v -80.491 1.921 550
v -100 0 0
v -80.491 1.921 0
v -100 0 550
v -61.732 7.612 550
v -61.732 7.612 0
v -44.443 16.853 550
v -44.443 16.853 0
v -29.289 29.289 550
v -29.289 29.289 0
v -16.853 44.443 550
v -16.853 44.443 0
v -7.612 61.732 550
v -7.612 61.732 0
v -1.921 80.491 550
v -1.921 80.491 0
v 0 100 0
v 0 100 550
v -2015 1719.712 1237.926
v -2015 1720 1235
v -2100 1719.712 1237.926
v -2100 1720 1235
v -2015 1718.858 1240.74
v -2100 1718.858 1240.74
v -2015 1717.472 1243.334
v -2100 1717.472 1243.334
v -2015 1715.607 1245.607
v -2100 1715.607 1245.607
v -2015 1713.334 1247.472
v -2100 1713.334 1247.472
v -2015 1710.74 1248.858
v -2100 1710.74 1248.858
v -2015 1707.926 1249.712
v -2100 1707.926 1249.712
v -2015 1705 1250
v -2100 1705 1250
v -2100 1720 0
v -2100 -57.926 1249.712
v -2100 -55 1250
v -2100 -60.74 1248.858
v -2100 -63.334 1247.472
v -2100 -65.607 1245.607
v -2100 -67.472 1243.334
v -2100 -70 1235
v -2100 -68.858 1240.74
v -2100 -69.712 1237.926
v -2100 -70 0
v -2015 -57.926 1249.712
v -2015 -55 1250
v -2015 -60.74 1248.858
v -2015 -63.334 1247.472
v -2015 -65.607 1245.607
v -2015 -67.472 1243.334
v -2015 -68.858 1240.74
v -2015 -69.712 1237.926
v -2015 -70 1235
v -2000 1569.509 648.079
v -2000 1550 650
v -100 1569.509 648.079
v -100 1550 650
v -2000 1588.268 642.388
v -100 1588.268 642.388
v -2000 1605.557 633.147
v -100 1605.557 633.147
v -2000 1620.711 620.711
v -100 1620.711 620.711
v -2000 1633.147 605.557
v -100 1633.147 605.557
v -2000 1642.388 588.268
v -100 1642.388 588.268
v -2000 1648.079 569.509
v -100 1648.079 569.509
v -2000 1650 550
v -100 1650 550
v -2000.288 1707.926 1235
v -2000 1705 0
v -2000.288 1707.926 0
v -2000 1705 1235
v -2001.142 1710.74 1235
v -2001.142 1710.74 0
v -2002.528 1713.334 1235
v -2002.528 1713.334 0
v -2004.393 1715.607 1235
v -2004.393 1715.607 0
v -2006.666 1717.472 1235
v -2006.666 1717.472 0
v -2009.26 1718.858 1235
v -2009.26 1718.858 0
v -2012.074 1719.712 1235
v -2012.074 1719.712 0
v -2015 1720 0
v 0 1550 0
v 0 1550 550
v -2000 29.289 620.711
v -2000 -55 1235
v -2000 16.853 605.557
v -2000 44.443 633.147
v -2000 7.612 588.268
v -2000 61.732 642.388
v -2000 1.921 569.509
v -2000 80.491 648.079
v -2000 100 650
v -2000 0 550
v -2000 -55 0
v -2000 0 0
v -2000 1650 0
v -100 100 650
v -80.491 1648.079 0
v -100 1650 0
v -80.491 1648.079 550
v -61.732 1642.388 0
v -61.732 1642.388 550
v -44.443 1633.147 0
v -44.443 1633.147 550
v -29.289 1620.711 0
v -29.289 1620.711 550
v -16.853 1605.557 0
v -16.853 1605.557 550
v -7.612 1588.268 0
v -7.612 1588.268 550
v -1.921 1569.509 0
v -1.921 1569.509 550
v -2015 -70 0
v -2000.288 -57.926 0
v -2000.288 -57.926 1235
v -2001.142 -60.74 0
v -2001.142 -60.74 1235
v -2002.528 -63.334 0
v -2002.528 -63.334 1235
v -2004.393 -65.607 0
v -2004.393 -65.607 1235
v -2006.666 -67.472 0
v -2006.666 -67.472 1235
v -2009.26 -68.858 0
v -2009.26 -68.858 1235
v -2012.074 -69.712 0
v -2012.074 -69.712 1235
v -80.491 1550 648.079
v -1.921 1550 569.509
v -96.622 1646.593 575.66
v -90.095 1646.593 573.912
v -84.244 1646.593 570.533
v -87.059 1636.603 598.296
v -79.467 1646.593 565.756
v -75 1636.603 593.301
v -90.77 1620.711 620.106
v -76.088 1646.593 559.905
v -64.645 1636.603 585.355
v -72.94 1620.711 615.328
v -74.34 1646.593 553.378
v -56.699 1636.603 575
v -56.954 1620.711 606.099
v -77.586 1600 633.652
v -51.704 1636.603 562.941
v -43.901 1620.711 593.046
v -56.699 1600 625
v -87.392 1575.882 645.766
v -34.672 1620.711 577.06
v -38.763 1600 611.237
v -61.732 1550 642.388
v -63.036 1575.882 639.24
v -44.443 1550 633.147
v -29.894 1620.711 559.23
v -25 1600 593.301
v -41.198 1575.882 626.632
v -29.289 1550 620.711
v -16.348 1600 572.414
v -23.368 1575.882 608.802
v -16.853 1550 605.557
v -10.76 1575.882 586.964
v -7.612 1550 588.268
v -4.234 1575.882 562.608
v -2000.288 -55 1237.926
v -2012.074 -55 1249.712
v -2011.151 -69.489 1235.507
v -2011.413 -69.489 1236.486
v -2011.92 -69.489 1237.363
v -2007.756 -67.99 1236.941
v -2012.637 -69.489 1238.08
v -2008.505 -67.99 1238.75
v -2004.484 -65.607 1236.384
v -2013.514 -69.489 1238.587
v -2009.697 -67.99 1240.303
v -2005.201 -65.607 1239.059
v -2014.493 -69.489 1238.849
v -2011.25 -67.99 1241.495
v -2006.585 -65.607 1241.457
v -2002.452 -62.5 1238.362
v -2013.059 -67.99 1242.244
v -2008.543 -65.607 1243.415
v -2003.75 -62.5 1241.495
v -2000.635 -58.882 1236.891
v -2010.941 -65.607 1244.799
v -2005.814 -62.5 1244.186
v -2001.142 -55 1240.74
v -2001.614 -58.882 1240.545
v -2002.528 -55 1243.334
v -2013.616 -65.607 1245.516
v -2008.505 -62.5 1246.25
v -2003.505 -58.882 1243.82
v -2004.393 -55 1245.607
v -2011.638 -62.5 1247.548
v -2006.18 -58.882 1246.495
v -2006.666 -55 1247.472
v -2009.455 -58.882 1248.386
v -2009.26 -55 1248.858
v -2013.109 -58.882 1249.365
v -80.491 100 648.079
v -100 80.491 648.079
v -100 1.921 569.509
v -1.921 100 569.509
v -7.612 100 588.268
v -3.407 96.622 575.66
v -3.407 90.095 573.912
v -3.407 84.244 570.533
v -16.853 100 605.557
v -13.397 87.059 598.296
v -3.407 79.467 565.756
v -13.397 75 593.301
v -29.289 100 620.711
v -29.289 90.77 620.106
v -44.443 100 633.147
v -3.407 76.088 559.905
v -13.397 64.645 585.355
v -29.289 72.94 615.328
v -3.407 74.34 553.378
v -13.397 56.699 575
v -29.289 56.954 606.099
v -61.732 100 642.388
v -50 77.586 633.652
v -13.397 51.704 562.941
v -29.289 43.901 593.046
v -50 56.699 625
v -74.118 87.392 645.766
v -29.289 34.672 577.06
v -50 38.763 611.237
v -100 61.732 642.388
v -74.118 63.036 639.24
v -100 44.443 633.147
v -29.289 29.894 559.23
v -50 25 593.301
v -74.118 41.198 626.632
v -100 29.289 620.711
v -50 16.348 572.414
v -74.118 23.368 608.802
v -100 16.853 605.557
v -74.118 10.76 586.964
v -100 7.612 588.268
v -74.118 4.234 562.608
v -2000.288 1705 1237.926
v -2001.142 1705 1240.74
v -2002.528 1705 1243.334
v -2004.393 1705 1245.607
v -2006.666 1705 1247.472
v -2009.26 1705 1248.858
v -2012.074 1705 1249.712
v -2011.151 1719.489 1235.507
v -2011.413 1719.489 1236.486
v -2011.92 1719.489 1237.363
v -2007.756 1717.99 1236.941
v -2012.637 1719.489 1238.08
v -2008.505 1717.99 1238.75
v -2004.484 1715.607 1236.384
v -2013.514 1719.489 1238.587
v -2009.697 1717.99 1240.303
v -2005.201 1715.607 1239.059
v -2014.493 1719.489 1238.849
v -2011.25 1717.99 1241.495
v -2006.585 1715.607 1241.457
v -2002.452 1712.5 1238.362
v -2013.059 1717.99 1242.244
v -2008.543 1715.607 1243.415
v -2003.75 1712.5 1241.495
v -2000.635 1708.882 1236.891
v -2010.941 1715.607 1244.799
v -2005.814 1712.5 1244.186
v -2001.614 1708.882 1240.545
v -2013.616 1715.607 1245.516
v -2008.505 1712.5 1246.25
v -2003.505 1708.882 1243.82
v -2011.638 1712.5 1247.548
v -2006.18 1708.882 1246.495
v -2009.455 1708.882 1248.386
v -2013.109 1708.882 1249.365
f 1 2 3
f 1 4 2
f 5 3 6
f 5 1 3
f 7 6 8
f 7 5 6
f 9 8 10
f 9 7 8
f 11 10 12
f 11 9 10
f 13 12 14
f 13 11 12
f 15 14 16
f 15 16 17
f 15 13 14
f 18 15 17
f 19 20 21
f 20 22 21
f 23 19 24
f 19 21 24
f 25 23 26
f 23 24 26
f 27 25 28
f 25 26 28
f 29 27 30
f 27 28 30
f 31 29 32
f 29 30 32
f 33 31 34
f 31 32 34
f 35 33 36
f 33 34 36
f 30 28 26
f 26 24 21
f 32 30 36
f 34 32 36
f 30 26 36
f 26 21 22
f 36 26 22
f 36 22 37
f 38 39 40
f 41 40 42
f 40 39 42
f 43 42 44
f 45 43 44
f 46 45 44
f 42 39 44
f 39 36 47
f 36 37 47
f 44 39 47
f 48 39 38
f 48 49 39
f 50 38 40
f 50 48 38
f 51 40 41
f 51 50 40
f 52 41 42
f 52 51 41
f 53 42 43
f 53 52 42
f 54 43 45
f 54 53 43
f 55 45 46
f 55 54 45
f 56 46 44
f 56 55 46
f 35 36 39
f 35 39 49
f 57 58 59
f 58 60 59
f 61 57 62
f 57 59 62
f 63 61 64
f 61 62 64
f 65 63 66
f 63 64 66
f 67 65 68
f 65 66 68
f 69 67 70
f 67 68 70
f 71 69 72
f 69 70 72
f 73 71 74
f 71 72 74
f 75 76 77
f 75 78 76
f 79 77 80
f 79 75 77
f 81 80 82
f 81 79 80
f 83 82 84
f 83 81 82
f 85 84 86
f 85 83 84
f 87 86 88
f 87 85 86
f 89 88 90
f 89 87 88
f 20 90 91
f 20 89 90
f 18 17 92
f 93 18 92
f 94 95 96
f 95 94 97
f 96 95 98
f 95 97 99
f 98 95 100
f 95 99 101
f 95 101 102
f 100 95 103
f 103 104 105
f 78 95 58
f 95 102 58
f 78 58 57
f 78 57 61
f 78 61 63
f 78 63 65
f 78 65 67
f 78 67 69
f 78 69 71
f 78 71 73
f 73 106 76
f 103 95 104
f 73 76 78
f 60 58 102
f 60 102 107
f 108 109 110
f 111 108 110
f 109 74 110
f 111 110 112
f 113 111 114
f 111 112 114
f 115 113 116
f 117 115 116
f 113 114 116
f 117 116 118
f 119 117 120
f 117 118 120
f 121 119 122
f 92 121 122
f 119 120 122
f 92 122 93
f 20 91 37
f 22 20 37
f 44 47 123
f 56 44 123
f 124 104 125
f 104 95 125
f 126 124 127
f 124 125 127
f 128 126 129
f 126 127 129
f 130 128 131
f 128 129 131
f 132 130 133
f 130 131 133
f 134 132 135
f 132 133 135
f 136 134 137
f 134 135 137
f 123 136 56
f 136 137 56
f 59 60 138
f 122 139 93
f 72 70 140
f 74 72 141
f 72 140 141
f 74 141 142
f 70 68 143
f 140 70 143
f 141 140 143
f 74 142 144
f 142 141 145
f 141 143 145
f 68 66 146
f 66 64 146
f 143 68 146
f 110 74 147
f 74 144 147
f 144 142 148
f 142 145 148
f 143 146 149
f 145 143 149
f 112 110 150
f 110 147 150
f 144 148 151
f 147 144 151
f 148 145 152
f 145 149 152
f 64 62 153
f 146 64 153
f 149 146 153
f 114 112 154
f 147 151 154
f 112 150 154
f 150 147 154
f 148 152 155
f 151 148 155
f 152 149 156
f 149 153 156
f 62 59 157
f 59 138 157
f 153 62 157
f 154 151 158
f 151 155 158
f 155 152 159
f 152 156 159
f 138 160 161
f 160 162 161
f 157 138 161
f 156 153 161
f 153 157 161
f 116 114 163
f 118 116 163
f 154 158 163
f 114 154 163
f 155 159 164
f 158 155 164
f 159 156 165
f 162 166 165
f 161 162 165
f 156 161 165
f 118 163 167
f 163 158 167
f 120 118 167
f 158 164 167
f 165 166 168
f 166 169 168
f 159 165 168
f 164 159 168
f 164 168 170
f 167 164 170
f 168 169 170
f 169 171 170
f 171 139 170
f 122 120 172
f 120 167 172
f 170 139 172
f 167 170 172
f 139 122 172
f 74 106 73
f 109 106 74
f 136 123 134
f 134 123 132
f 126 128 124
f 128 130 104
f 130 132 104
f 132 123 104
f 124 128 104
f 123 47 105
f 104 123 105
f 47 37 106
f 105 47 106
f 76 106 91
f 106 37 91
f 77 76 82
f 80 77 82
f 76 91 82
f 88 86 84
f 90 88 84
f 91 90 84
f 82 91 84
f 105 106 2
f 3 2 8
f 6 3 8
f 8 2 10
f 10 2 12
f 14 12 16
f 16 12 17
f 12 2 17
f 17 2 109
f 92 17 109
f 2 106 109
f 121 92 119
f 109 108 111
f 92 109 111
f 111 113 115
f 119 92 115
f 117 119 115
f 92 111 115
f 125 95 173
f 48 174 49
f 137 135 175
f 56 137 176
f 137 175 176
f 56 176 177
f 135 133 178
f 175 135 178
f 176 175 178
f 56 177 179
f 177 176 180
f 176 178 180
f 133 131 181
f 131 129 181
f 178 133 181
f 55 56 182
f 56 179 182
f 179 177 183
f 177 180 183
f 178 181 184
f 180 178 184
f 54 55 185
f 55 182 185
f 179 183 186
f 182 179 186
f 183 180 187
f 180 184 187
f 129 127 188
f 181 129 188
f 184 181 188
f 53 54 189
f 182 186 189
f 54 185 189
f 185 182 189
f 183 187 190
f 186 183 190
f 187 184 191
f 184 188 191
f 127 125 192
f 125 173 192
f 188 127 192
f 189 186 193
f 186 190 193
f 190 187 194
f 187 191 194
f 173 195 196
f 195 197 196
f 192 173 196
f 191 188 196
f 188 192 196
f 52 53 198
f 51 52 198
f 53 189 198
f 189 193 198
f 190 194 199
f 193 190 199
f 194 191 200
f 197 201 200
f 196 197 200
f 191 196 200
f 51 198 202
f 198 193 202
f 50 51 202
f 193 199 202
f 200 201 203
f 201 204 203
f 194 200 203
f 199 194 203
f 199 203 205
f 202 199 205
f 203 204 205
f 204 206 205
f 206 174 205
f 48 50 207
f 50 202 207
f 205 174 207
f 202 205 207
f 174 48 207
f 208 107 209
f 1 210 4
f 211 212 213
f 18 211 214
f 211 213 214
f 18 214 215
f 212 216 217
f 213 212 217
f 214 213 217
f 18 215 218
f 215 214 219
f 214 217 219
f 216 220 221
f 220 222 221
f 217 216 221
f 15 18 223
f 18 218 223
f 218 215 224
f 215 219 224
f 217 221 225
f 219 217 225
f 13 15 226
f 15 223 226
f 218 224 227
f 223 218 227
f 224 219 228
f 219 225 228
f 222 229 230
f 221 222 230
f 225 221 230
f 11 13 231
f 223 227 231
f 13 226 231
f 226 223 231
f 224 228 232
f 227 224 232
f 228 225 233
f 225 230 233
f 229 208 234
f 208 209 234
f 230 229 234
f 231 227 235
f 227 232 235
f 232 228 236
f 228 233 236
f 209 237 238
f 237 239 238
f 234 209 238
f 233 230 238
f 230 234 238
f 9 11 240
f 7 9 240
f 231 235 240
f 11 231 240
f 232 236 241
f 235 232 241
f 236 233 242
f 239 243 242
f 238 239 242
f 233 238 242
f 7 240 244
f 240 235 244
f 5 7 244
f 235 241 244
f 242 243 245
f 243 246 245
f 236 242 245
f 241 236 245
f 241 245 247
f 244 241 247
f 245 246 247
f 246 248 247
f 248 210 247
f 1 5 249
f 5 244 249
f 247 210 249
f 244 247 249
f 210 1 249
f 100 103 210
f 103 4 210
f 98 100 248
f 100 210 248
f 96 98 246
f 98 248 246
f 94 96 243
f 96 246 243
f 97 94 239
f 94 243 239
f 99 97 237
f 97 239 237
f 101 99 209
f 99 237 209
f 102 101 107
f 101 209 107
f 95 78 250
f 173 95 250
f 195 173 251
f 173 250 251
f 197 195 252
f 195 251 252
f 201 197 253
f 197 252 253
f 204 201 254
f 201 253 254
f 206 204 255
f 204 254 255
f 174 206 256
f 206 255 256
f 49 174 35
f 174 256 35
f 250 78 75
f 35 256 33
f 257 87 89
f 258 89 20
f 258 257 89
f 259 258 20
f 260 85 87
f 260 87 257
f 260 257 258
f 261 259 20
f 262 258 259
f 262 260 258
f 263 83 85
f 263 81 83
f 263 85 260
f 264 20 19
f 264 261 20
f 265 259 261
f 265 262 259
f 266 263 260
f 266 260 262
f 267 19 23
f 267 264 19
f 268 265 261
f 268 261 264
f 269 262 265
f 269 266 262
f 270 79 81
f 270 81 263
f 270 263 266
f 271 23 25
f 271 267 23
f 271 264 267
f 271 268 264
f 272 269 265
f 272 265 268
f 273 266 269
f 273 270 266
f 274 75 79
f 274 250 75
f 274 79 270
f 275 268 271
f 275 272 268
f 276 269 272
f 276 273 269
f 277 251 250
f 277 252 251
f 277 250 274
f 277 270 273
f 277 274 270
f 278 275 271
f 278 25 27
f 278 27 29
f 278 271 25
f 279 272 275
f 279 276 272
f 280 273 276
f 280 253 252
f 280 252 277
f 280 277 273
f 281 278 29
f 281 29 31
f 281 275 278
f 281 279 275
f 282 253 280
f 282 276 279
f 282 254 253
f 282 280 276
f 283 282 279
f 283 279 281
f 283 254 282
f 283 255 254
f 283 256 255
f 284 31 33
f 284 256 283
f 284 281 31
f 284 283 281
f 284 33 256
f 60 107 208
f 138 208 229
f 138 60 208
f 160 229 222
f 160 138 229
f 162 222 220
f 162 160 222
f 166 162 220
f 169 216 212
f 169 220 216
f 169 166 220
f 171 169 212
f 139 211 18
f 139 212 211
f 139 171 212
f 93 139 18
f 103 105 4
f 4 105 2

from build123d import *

# Parameters (mm, degrees)
F0_W     = 2000
F0_H     = 1650
F1_DEPTH = 650
F2_DEPTH = 1250
F3_R     = 15
F4_R     = 100


with BuildPart() as f1:
    # F0 (on Top) → F1 (new body)
    with BuildSketch(Plane.XY):
        with Locations((-1000, 825)):
            Rectangle(F0_W, F0_H)
    extrude(amount=F1_DEPTH)

    # F0 (on Top) → F2 (join)
    with BuildSketch(Plane.XY):
        Polygon((-2000, -70), (-2000, 0), (-2000, 1650), (-2000, 1720), (-2100, 1720), (-2100, -70), align=None)
    extrude(amount=F2_DEPTH)

    # F3
    f3_edges = [f1.edges().sort_by_distance(p)[0] for p in [
        (-2000, 825, 1250),
        (-2000, 1720, 625),
        (-2000, -70, 625),
        (-2050, -70, 1250),
        (-2050, 1720, 1250),
    ]]
    fillet(f3_edges, radius=F3_R)

    # F4
    f4_edges = [f1.edges().sort_by_distance(p)[0] for p in [
        (-1000, 0, 650),
        (0, 825, 650),
        (-1000, 1650, 650),
        (0, 0, 325),
        (0, 1650, 325),
    ]]
    fillet(f4_edges, radius=F4_R)


solid = f1.part
